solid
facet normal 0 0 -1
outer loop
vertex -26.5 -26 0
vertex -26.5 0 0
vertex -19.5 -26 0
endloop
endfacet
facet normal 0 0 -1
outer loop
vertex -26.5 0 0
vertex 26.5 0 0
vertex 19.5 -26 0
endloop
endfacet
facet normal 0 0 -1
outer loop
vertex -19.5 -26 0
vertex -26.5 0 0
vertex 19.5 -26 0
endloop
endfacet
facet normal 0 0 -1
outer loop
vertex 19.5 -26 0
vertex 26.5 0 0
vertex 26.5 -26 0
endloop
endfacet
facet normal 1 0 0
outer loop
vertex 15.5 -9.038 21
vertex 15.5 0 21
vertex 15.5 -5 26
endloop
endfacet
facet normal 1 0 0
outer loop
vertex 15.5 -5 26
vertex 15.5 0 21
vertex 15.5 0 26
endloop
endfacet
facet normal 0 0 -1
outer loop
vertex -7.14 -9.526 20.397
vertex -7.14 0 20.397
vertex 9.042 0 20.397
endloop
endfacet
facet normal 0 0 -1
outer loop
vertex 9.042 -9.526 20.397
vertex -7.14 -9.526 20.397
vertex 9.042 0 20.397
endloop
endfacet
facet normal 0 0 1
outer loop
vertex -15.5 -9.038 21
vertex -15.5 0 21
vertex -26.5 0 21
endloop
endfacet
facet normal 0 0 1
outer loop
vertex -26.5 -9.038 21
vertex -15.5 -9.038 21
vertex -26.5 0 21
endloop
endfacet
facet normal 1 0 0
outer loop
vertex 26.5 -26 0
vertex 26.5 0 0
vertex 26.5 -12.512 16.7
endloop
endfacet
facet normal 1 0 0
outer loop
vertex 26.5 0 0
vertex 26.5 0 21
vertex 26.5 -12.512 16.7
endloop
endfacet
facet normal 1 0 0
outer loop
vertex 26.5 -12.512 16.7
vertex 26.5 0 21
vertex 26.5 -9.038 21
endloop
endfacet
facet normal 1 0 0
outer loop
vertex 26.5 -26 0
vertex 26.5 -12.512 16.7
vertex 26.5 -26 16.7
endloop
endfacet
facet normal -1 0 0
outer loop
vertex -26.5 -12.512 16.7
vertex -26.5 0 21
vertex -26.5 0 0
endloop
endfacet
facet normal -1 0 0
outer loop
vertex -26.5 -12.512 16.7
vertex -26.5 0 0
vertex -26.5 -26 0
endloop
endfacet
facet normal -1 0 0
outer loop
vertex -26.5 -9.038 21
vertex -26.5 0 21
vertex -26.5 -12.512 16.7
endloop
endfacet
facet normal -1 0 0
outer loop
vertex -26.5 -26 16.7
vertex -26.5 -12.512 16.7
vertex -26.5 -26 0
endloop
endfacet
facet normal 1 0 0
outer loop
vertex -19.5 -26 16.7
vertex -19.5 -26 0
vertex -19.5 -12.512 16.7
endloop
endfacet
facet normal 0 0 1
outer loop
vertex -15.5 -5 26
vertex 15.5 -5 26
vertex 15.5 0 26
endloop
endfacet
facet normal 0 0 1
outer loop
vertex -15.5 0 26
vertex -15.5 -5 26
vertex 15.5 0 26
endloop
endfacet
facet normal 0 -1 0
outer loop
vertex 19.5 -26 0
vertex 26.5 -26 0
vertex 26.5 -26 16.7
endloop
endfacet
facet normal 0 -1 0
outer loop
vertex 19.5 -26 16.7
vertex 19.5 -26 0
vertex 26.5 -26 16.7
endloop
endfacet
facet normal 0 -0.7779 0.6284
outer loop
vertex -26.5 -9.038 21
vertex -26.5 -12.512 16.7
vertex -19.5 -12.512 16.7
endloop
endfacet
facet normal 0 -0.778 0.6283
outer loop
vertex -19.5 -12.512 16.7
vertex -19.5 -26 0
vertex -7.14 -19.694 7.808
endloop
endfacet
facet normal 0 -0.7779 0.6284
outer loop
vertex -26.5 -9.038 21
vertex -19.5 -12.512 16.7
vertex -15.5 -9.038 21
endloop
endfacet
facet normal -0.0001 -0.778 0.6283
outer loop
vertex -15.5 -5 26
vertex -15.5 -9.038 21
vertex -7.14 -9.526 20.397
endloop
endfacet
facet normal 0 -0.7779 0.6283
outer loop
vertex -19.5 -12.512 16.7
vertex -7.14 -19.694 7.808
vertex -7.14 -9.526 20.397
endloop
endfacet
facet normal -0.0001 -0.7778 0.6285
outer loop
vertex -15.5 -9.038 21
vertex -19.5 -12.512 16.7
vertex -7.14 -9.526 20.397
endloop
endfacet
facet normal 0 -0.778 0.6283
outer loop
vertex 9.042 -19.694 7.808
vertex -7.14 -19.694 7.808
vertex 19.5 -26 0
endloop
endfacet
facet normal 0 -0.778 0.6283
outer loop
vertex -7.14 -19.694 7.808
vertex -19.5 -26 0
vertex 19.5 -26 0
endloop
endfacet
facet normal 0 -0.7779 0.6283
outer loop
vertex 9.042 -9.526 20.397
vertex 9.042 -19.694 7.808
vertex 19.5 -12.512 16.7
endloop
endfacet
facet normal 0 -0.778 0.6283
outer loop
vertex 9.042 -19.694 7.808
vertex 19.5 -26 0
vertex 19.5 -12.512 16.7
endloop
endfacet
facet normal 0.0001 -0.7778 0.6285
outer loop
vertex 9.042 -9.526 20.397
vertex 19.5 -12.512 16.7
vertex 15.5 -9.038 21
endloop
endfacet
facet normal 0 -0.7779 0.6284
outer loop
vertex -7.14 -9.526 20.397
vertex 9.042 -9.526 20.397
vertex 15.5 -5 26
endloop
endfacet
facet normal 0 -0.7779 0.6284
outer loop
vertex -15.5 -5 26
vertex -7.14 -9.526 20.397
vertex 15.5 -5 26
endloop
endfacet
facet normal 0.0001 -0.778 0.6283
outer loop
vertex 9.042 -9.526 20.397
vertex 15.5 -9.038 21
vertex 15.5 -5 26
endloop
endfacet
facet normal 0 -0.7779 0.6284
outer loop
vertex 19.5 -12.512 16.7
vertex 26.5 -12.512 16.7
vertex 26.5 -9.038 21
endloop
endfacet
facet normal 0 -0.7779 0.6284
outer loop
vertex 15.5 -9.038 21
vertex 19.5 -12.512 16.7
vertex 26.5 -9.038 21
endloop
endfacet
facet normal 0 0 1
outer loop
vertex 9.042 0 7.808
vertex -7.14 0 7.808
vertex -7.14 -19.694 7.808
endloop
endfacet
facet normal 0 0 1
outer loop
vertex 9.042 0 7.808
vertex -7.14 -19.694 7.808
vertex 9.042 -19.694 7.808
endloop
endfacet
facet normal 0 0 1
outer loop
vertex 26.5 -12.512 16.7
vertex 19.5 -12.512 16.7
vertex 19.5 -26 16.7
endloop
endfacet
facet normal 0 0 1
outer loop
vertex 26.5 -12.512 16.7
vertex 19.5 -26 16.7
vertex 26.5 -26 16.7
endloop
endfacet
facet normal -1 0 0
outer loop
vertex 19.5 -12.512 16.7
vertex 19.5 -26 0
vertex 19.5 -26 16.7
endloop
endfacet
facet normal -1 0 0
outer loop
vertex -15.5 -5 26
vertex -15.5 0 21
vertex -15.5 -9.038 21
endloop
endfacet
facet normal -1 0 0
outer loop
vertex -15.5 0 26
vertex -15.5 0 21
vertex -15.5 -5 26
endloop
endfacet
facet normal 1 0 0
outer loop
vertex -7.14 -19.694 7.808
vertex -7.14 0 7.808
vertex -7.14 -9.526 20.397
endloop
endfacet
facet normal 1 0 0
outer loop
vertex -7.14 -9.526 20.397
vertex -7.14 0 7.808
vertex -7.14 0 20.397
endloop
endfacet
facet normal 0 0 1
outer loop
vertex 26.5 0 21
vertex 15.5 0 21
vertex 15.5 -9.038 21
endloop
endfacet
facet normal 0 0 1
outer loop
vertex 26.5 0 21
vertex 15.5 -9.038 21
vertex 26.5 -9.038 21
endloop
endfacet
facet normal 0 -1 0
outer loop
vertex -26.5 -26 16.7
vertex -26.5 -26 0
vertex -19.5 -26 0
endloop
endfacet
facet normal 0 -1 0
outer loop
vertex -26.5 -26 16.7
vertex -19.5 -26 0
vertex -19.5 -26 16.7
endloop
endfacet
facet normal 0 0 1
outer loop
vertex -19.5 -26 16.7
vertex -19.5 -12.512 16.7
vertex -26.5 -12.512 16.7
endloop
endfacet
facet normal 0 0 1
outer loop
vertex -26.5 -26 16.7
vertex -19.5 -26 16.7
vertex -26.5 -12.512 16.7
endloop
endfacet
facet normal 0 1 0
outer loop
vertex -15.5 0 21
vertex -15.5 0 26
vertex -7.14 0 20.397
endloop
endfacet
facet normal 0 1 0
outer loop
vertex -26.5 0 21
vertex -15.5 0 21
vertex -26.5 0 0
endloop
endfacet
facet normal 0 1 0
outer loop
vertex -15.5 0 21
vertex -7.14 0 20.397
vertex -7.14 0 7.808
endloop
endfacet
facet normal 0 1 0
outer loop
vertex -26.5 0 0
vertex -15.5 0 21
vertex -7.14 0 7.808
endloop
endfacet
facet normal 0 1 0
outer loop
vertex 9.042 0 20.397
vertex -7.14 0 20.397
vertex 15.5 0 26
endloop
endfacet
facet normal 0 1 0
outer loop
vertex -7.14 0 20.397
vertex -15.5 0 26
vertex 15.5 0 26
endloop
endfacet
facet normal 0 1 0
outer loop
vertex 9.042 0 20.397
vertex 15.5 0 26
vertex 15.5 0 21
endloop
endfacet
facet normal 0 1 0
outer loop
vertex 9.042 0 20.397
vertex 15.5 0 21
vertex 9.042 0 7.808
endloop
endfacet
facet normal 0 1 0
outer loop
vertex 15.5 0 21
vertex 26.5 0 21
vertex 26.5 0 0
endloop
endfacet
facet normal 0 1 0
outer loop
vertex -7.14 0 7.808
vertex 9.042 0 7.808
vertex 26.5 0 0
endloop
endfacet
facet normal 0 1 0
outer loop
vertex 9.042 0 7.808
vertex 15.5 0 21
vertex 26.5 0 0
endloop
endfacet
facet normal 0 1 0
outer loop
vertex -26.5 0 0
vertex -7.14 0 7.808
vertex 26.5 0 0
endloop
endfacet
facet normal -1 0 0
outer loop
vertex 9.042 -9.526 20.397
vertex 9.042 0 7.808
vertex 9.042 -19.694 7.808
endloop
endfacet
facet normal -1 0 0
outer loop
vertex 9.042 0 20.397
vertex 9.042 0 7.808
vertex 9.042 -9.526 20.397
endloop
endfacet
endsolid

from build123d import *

# Parameters (mm, degrees)
PAD_DEPTH       = 26.5
PAD_DEPTH_BACK  = 26.5
SKETCH001_W     = 5
SKETCH001_H     = 11
POCKET_DEPTH    = 155.012627
SKETCH002_W     = 16.7
SKETCH002_H     = 7
PAD001_DEPTH    = 26
SKETCH004_W     = 12.588901
SKETCH004_H     = 16.182331
POCKET001_DEPTH = 26.001


with BuildPart() as part:
    # Sketch → Pad (new body, two sides)
    with BuildSketch(Plane.YZ) as pad_sk:
        Polygon((-26, 0), (-5, 26), (0, 26), (0, 0), align=None)
    extrude(amount=PAD_DEPTH)
    extrude(pad_sk.sketch, amount=-PAD_DEPTH_BACK)

    # Sketch001 (on Face3 of Pad) → Pocket (cut, through all)
    with BuildSketch(Plane.ZX):
        with Locations((23.5, 21)):
            Rectangle(SKETCH001_W, SKETCH001_H)
    pocket = extrude(amount=-POCKET_DEPTH, mode=Mode.SUBTRACT)

    # Mirrored: Pocket across Sketch001 H_Axis
    add(pocket.mirror(Plane.YZ), mode=Mode.SUBTRACT)

    # Sketch002 (on Face10 of Mirrored) → Pad001 (join)
    with BuildSketch(Plane.ZX):
        with Locations((8.35, 23)):
            Rectangle(SKETCH002_W, SKETCH002_H)
    pad001 = extrude(amount=-PAD001_DEPTH)

    # Mirrored001: Pad001 across Sketch002 H_Axis
    add(pad001.mirror(Plane.YZ))

    # Sketch004 (on Face6 of Mirrored001) → Pocket001 (cut, through all)
    with BuildSketch(Plane.ZX):
        with Locations((14.102484, 0.951072)):
            Rectangle(SKETCH004_W, SKETCH004_H)
    extrude(amount=-POCKET001_DEPTH, mode=Mode.SUBTRACT)


solid = part.part
